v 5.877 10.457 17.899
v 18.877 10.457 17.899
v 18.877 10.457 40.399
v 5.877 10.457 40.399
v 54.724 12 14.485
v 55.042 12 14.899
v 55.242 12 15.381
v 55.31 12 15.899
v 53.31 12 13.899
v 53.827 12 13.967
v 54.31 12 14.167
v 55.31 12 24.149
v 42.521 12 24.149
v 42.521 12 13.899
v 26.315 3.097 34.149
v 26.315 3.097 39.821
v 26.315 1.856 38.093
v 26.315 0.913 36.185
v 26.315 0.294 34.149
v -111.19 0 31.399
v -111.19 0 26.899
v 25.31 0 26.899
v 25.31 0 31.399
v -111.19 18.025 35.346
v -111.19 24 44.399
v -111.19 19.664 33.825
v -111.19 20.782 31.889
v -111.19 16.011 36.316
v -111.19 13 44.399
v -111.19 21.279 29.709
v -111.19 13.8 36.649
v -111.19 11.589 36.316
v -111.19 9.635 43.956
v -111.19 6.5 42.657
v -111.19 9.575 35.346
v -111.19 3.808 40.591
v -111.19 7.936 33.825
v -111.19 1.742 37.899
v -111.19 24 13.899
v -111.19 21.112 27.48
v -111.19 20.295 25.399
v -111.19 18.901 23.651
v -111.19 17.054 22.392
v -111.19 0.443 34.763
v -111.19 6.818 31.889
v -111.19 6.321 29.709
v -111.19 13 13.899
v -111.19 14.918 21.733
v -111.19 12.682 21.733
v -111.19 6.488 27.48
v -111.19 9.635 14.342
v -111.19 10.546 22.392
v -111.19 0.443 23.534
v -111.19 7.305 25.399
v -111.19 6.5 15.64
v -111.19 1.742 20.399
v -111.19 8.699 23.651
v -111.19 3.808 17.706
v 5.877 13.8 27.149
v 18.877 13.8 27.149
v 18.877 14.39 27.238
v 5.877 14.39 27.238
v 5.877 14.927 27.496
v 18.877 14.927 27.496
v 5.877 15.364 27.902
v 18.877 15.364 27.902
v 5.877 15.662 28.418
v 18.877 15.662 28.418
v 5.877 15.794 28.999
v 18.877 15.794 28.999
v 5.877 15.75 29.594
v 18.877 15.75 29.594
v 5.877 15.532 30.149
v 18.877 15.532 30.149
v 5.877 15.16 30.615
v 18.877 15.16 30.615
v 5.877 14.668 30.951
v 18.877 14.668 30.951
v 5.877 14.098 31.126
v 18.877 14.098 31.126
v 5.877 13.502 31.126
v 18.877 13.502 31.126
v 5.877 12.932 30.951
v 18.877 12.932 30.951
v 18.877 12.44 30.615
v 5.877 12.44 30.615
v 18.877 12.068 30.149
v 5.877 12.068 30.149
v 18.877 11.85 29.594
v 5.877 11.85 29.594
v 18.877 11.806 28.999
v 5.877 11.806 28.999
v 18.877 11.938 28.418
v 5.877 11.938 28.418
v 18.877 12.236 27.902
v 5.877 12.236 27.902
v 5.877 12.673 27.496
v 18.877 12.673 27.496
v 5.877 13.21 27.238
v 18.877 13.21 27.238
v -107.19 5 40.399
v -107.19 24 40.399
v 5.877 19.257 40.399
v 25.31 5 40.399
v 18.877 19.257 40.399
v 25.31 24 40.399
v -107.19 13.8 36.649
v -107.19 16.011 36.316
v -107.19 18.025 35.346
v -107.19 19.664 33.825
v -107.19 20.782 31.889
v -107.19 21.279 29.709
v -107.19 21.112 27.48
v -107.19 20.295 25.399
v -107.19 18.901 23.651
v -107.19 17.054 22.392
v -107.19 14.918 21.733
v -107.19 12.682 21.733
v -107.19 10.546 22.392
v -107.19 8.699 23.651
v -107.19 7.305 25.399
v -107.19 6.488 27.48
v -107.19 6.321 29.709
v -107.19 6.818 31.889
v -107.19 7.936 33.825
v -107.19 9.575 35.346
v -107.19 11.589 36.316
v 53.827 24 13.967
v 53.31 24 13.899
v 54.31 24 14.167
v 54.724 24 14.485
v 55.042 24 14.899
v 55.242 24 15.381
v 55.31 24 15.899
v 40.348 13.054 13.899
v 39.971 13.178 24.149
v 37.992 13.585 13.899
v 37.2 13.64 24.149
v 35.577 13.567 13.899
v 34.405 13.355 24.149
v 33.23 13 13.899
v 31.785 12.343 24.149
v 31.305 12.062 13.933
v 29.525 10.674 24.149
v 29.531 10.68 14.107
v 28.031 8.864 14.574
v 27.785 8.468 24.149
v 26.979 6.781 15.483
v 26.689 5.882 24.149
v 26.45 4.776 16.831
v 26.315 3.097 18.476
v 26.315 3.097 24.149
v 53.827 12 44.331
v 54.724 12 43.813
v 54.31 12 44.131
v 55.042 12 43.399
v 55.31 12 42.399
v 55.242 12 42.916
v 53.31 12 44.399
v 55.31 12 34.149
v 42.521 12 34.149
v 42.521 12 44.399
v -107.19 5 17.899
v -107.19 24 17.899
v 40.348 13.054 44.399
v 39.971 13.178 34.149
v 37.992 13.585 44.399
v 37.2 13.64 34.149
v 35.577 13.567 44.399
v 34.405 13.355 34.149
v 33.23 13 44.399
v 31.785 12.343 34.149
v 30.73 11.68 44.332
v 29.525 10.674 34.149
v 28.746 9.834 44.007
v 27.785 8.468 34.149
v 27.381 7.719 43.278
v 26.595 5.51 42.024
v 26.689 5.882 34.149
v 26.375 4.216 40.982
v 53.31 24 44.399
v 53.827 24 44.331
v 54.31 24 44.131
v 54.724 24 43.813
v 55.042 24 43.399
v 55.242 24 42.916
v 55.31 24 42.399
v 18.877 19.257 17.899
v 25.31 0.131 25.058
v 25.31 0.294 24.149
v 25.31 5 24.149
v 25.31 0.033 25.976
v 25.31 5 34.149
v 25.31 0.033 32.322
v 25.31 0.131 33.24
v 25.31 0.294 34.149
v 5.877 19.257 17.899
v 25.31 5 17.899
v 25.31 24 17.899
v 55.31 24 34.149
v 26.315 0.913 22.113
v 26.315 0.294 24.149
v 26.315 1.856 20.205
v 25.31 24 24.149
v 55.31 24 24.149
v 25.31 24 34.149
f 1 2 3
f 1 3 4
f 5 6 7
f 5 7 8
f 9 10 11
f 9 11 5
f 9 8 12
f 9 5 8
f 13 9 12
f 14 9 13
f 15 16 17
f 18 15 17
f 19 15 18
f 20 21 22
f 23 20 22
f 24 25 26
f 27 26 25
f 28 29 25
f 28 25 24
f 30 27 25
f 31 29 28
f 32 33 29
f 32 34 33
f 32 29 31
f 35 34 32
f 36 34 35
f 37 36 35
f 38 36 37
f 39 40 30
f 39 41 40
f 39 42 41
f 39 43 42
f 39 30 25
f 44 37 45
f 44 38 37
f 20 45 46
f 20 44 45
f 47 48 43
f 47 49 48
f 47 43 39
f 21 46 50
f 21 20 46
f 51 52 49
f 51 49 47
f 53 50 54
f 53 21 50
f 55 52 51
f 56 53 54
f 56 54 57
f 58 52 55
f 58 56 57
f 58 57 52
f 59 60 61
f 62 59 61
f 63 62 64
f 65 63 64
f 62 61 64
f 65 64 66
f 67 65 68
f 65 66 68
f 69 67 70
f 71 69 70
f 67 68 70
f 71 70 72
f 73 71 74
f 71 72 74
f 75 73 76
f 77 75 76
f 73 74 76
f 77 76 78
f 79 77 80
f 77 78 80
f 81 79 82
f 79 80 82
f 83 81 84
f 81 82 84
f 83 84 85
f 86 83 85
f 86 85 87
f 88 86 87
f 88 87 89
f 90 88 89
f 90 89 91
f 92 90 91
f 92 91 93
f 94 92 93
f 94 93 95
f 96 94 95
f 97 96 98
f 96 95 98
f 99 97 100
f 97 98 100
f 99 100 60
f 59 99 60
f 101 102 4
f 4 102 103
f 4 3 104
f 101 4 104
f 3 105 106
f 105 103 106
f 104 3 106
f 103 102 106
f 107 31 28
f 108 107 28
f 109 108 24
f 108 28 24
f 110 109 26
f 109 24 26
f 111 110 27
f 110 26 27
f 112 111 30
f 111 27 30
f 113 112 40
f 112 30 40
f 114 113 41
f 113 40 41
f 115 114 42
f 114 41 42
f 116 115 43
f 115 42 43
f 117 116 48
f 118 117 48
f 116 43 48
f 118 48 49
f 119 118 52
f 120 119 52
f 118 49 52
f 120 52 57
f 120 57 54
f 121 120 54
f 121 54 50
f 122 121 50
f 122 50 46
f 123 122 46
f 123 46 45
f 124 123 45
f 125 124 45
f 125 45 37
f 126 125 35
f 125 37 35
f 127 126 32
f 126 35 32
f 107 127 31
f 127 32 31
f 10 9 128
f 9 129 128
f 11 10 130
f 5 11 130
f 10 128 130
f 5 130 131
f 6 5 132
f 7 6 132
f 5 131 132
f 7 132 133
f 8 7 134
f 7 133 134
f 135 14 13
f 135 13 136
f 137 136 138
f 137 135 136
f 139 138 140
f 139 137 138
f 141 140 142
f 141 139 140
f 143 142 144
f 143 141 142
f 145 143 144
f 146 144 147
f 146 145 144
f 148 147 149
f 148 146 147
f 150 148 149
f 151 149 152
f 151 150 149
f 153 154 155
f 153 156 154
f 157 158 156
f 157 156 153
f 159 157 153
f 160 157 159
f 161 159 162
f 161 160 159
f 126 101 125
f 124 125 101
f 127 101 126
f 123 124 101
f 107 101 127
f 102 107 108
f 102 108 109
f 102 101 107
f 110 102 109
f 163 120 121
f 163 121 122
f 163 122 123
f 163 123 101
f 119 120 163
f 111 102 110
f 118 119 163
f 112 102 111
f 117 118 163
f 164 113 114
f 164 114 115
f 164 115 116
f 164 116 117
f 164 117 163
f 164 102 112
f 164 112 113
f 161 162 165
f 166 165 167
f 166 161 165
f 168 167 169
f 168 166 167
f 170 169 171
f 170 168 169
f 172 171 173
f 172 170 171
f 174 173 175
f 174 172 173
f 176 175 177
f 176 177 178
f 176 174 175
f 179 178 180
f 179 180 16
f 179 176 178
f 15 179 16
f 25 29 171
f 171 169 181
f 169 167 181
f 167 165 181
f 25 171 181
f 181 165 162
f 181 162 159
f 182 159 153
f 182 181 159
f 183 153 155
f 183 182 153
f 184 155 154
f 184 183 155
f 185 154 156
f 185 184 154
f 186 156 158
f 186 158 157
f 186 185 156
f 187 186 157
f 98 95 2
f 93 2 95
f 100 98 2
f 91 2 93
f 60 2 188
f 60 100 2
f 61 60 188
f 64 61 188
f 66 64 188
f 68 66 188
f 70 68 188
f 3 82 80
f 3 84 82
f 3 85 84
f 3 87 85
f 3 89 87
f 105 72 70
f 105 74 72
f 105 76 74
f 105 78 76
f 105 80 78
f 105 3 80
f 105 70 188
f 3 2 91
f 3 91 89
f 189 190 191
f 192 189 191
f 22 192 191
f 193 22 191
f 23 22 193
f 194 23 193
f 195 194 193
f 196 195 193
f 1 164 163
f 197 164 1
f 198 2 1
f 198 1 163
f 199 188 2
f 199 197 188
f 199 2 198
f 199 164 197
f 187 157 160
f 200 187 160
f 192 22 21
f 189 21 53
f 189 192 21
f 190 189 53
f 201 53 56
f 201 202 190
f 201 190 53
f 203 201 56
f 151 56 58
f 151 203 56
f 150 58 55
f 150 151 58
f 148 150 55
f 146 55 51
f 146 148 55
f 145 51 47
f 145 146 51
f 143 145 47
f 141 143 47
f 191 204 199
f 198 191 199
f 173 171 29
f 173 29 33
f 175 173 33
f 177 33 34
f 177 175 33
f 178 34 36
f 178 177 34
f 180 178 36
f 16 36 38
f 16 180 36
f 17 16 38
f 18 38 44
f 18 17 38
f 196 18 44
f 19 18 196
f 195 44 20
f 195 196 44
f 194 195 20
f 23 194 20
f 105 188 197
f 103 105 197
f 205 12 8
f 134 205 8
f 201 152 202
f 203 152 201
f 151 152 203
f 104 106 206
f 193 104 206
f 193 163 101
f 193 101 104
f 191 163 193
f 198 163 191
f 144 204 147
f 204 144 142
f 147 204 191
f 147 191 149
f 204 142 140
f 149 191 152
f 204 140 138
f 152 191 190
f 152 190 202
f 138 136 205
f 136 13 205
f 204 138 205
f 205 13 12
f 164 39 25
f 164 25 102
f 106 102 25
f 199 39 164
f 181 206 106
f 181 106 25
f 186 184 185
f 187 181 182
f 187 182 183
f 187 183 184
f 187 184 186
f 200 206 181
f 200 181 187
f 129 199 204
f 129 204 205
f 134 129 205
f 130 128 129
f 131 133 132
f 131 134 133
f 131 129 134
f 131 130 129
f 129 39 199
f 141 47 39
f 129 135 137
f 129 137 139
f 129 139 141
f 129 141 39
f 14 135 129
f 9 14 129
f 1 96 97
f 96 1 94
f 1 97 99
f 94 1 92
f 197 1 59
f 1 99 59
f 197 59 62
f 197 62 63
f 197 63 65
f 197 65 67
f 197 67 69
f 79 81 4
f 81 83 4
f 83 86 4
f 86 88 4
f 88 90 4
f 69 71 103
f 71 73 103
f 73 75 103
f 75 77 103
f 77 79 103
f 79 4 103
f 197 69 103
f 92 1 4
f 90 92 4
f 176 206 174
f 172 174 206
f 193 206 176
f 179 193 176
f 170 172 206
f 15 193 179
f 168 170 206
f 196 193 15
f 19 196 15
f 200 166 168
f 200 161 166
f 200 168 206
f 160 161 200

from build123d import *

# Parameters (mm, degrees)
SKETCH1_W           = 166.5
SKETCH1_H           = 30.5
BOSS_EXTRUDE1_DEPTH = 24
SKETCH2_W           = 30
SKETCH2_H           = 10
CUT_EXTRUDE1_DEPTH  = 123.108559222
CUT_EXTRUDE2_DEPTH  = 118.768839527
FILLET1_R           = 2
FILLET2_R           = 13
SKETCH5_W           = 132.5
SKETCH5_H           = 22.5
CUT_EXTRUDE3_DEPTH  = 19
SKETCH6_R           = 7.5
CUT_EXTRUDE4_DEPTH  = 4
SKETCH7_W           = 13
SKETCH7_H           = 8.8
BOSS_EXTRUDE2_DEPTH = 22.5
SKETCH8_R           = 2
CUT_EXTRUDE5_DEPTH  = 13


with BuildPart() as part:
    # Sketch1 → Boss-Extrude1 (new body)
    with BuildSketch(Plane(origin=(0, 0, 0), x_dir=(1, 0, 0), z_dir=(0, 1, 0))):
        with Locations((-27.940150479, -29.14876881)):
            Rectangle(SKETCH1_W, SKETCH1_H)
    extrude(amount=BOSS_EXTRUDE1_DEPTH)

    # Sketch2 → Cut-Extrude1 (cut, through all)
    with BuildSketch(Plane.XZ):
        with Locations((40.309849521, 29.14876881)):
            Rectangle(SKETCH2_W, SKETCH2_H)
    extrude(amount=-CUT_EXTRUDE1_DEPTH, mode=Mode.SUBTRACT)

    # Sketch4 → Cut-Extrude2 (cut, through all)
    with BuildSketch(Plane(origin=(0, 0, 13.89876881), x_dir=(-1, 0, 0), z_dir=(0, 0, -1))):
        with BuildLine():
            Line((-26.315186332, 3.097371167), (-26.315186332, 0))
            Line((-26.315186332, 0), (-55.309849521, 0))
            Line((-55.309849521, 0), (-55.309849521, 12))
            Line((-55.309849521, 12), (-42.521374472, 12))
            ThreePointArc((-42.521374472, 12), (-31.784812397, 12.342604184), (-26.315186332, 3.097371167))
        make_face()
    extrude(amount=-CUT_EXTRUDE2_DEPTH, mode=Mode.SUBTRACT)

    # Fillet1
    fillet1_edges = [part.edges().sort_by_distance(p)[0] for p in [
        (55.309849521, 18, 44.39876881),
        (55.309849521, 18, 13.89876881),
    ]]
    fillet(fillet1_edges, radius=FILLET1_R)

    # Fillet2
    fillet2_edges = [part.edges().sort_by_distance(p)[0] for p in [
        (-42.437482073, 0, 44.39876881),
        (-42.437482073, 0, 13.89876881),
    ]]
    fillet(fillet2_edges, radius=FILLET2_R)

    # Sketch5 → Cut-Extrude3 (cut)
    with BuildSketch(Plane(origin=(0, 24, 0), x_dir=(1, 0, 0), z_dir=(0, 1, 0))):
        with Locations((-40.940150479, -29.14876881)):
            Rectangle(SKETCH5_W, SKETCH5_H)
    extrude(amount=-CUT_EXTRUDE3_DEPTH, mode=Mode.SUBTRACT)

    # Sketch6 → Cut-Extrude4 (cut)
    with BuildSketch(Plane.ZY.offset(111.190150479)):
        with Locations((29.14876881, 13.8)):
            Circle(SKETCH6_R)
    extrude(amount=-CUT_EXTRUDE4_DEPTH, mode=Mode.SUBTRACT)

    # Sketch7 → Boss-Extrude2 (add)
    with BuildSketch(Plane(origin=(0, 0, 40.39876881), x_dir=(-1, 0, 0), z_dir=(0, 0, -1))):
        with Locations((-12.376968122, 14.857402626)):
            Rectangle(SKETCH7_W, SKETCH7_H)
    extrude(amount=BOSS_EXTRUDE2_DEPTH)

    # Sketch8 → Cut-Extrude5 (cut)
    with BuildSketch(Plane(origin=(18.876968122, 0, 0), x_dir=(0, 0, -1), z_dir=(1, 0, 0))):
        with Locations((-29.14876881, 13.8)):
            Circle(SKETCH8_R)
    extrude(amount=-CUT_EXTRUDE5_DEPTH, mode=Mode.SUBTRACT)


solid = part.part
